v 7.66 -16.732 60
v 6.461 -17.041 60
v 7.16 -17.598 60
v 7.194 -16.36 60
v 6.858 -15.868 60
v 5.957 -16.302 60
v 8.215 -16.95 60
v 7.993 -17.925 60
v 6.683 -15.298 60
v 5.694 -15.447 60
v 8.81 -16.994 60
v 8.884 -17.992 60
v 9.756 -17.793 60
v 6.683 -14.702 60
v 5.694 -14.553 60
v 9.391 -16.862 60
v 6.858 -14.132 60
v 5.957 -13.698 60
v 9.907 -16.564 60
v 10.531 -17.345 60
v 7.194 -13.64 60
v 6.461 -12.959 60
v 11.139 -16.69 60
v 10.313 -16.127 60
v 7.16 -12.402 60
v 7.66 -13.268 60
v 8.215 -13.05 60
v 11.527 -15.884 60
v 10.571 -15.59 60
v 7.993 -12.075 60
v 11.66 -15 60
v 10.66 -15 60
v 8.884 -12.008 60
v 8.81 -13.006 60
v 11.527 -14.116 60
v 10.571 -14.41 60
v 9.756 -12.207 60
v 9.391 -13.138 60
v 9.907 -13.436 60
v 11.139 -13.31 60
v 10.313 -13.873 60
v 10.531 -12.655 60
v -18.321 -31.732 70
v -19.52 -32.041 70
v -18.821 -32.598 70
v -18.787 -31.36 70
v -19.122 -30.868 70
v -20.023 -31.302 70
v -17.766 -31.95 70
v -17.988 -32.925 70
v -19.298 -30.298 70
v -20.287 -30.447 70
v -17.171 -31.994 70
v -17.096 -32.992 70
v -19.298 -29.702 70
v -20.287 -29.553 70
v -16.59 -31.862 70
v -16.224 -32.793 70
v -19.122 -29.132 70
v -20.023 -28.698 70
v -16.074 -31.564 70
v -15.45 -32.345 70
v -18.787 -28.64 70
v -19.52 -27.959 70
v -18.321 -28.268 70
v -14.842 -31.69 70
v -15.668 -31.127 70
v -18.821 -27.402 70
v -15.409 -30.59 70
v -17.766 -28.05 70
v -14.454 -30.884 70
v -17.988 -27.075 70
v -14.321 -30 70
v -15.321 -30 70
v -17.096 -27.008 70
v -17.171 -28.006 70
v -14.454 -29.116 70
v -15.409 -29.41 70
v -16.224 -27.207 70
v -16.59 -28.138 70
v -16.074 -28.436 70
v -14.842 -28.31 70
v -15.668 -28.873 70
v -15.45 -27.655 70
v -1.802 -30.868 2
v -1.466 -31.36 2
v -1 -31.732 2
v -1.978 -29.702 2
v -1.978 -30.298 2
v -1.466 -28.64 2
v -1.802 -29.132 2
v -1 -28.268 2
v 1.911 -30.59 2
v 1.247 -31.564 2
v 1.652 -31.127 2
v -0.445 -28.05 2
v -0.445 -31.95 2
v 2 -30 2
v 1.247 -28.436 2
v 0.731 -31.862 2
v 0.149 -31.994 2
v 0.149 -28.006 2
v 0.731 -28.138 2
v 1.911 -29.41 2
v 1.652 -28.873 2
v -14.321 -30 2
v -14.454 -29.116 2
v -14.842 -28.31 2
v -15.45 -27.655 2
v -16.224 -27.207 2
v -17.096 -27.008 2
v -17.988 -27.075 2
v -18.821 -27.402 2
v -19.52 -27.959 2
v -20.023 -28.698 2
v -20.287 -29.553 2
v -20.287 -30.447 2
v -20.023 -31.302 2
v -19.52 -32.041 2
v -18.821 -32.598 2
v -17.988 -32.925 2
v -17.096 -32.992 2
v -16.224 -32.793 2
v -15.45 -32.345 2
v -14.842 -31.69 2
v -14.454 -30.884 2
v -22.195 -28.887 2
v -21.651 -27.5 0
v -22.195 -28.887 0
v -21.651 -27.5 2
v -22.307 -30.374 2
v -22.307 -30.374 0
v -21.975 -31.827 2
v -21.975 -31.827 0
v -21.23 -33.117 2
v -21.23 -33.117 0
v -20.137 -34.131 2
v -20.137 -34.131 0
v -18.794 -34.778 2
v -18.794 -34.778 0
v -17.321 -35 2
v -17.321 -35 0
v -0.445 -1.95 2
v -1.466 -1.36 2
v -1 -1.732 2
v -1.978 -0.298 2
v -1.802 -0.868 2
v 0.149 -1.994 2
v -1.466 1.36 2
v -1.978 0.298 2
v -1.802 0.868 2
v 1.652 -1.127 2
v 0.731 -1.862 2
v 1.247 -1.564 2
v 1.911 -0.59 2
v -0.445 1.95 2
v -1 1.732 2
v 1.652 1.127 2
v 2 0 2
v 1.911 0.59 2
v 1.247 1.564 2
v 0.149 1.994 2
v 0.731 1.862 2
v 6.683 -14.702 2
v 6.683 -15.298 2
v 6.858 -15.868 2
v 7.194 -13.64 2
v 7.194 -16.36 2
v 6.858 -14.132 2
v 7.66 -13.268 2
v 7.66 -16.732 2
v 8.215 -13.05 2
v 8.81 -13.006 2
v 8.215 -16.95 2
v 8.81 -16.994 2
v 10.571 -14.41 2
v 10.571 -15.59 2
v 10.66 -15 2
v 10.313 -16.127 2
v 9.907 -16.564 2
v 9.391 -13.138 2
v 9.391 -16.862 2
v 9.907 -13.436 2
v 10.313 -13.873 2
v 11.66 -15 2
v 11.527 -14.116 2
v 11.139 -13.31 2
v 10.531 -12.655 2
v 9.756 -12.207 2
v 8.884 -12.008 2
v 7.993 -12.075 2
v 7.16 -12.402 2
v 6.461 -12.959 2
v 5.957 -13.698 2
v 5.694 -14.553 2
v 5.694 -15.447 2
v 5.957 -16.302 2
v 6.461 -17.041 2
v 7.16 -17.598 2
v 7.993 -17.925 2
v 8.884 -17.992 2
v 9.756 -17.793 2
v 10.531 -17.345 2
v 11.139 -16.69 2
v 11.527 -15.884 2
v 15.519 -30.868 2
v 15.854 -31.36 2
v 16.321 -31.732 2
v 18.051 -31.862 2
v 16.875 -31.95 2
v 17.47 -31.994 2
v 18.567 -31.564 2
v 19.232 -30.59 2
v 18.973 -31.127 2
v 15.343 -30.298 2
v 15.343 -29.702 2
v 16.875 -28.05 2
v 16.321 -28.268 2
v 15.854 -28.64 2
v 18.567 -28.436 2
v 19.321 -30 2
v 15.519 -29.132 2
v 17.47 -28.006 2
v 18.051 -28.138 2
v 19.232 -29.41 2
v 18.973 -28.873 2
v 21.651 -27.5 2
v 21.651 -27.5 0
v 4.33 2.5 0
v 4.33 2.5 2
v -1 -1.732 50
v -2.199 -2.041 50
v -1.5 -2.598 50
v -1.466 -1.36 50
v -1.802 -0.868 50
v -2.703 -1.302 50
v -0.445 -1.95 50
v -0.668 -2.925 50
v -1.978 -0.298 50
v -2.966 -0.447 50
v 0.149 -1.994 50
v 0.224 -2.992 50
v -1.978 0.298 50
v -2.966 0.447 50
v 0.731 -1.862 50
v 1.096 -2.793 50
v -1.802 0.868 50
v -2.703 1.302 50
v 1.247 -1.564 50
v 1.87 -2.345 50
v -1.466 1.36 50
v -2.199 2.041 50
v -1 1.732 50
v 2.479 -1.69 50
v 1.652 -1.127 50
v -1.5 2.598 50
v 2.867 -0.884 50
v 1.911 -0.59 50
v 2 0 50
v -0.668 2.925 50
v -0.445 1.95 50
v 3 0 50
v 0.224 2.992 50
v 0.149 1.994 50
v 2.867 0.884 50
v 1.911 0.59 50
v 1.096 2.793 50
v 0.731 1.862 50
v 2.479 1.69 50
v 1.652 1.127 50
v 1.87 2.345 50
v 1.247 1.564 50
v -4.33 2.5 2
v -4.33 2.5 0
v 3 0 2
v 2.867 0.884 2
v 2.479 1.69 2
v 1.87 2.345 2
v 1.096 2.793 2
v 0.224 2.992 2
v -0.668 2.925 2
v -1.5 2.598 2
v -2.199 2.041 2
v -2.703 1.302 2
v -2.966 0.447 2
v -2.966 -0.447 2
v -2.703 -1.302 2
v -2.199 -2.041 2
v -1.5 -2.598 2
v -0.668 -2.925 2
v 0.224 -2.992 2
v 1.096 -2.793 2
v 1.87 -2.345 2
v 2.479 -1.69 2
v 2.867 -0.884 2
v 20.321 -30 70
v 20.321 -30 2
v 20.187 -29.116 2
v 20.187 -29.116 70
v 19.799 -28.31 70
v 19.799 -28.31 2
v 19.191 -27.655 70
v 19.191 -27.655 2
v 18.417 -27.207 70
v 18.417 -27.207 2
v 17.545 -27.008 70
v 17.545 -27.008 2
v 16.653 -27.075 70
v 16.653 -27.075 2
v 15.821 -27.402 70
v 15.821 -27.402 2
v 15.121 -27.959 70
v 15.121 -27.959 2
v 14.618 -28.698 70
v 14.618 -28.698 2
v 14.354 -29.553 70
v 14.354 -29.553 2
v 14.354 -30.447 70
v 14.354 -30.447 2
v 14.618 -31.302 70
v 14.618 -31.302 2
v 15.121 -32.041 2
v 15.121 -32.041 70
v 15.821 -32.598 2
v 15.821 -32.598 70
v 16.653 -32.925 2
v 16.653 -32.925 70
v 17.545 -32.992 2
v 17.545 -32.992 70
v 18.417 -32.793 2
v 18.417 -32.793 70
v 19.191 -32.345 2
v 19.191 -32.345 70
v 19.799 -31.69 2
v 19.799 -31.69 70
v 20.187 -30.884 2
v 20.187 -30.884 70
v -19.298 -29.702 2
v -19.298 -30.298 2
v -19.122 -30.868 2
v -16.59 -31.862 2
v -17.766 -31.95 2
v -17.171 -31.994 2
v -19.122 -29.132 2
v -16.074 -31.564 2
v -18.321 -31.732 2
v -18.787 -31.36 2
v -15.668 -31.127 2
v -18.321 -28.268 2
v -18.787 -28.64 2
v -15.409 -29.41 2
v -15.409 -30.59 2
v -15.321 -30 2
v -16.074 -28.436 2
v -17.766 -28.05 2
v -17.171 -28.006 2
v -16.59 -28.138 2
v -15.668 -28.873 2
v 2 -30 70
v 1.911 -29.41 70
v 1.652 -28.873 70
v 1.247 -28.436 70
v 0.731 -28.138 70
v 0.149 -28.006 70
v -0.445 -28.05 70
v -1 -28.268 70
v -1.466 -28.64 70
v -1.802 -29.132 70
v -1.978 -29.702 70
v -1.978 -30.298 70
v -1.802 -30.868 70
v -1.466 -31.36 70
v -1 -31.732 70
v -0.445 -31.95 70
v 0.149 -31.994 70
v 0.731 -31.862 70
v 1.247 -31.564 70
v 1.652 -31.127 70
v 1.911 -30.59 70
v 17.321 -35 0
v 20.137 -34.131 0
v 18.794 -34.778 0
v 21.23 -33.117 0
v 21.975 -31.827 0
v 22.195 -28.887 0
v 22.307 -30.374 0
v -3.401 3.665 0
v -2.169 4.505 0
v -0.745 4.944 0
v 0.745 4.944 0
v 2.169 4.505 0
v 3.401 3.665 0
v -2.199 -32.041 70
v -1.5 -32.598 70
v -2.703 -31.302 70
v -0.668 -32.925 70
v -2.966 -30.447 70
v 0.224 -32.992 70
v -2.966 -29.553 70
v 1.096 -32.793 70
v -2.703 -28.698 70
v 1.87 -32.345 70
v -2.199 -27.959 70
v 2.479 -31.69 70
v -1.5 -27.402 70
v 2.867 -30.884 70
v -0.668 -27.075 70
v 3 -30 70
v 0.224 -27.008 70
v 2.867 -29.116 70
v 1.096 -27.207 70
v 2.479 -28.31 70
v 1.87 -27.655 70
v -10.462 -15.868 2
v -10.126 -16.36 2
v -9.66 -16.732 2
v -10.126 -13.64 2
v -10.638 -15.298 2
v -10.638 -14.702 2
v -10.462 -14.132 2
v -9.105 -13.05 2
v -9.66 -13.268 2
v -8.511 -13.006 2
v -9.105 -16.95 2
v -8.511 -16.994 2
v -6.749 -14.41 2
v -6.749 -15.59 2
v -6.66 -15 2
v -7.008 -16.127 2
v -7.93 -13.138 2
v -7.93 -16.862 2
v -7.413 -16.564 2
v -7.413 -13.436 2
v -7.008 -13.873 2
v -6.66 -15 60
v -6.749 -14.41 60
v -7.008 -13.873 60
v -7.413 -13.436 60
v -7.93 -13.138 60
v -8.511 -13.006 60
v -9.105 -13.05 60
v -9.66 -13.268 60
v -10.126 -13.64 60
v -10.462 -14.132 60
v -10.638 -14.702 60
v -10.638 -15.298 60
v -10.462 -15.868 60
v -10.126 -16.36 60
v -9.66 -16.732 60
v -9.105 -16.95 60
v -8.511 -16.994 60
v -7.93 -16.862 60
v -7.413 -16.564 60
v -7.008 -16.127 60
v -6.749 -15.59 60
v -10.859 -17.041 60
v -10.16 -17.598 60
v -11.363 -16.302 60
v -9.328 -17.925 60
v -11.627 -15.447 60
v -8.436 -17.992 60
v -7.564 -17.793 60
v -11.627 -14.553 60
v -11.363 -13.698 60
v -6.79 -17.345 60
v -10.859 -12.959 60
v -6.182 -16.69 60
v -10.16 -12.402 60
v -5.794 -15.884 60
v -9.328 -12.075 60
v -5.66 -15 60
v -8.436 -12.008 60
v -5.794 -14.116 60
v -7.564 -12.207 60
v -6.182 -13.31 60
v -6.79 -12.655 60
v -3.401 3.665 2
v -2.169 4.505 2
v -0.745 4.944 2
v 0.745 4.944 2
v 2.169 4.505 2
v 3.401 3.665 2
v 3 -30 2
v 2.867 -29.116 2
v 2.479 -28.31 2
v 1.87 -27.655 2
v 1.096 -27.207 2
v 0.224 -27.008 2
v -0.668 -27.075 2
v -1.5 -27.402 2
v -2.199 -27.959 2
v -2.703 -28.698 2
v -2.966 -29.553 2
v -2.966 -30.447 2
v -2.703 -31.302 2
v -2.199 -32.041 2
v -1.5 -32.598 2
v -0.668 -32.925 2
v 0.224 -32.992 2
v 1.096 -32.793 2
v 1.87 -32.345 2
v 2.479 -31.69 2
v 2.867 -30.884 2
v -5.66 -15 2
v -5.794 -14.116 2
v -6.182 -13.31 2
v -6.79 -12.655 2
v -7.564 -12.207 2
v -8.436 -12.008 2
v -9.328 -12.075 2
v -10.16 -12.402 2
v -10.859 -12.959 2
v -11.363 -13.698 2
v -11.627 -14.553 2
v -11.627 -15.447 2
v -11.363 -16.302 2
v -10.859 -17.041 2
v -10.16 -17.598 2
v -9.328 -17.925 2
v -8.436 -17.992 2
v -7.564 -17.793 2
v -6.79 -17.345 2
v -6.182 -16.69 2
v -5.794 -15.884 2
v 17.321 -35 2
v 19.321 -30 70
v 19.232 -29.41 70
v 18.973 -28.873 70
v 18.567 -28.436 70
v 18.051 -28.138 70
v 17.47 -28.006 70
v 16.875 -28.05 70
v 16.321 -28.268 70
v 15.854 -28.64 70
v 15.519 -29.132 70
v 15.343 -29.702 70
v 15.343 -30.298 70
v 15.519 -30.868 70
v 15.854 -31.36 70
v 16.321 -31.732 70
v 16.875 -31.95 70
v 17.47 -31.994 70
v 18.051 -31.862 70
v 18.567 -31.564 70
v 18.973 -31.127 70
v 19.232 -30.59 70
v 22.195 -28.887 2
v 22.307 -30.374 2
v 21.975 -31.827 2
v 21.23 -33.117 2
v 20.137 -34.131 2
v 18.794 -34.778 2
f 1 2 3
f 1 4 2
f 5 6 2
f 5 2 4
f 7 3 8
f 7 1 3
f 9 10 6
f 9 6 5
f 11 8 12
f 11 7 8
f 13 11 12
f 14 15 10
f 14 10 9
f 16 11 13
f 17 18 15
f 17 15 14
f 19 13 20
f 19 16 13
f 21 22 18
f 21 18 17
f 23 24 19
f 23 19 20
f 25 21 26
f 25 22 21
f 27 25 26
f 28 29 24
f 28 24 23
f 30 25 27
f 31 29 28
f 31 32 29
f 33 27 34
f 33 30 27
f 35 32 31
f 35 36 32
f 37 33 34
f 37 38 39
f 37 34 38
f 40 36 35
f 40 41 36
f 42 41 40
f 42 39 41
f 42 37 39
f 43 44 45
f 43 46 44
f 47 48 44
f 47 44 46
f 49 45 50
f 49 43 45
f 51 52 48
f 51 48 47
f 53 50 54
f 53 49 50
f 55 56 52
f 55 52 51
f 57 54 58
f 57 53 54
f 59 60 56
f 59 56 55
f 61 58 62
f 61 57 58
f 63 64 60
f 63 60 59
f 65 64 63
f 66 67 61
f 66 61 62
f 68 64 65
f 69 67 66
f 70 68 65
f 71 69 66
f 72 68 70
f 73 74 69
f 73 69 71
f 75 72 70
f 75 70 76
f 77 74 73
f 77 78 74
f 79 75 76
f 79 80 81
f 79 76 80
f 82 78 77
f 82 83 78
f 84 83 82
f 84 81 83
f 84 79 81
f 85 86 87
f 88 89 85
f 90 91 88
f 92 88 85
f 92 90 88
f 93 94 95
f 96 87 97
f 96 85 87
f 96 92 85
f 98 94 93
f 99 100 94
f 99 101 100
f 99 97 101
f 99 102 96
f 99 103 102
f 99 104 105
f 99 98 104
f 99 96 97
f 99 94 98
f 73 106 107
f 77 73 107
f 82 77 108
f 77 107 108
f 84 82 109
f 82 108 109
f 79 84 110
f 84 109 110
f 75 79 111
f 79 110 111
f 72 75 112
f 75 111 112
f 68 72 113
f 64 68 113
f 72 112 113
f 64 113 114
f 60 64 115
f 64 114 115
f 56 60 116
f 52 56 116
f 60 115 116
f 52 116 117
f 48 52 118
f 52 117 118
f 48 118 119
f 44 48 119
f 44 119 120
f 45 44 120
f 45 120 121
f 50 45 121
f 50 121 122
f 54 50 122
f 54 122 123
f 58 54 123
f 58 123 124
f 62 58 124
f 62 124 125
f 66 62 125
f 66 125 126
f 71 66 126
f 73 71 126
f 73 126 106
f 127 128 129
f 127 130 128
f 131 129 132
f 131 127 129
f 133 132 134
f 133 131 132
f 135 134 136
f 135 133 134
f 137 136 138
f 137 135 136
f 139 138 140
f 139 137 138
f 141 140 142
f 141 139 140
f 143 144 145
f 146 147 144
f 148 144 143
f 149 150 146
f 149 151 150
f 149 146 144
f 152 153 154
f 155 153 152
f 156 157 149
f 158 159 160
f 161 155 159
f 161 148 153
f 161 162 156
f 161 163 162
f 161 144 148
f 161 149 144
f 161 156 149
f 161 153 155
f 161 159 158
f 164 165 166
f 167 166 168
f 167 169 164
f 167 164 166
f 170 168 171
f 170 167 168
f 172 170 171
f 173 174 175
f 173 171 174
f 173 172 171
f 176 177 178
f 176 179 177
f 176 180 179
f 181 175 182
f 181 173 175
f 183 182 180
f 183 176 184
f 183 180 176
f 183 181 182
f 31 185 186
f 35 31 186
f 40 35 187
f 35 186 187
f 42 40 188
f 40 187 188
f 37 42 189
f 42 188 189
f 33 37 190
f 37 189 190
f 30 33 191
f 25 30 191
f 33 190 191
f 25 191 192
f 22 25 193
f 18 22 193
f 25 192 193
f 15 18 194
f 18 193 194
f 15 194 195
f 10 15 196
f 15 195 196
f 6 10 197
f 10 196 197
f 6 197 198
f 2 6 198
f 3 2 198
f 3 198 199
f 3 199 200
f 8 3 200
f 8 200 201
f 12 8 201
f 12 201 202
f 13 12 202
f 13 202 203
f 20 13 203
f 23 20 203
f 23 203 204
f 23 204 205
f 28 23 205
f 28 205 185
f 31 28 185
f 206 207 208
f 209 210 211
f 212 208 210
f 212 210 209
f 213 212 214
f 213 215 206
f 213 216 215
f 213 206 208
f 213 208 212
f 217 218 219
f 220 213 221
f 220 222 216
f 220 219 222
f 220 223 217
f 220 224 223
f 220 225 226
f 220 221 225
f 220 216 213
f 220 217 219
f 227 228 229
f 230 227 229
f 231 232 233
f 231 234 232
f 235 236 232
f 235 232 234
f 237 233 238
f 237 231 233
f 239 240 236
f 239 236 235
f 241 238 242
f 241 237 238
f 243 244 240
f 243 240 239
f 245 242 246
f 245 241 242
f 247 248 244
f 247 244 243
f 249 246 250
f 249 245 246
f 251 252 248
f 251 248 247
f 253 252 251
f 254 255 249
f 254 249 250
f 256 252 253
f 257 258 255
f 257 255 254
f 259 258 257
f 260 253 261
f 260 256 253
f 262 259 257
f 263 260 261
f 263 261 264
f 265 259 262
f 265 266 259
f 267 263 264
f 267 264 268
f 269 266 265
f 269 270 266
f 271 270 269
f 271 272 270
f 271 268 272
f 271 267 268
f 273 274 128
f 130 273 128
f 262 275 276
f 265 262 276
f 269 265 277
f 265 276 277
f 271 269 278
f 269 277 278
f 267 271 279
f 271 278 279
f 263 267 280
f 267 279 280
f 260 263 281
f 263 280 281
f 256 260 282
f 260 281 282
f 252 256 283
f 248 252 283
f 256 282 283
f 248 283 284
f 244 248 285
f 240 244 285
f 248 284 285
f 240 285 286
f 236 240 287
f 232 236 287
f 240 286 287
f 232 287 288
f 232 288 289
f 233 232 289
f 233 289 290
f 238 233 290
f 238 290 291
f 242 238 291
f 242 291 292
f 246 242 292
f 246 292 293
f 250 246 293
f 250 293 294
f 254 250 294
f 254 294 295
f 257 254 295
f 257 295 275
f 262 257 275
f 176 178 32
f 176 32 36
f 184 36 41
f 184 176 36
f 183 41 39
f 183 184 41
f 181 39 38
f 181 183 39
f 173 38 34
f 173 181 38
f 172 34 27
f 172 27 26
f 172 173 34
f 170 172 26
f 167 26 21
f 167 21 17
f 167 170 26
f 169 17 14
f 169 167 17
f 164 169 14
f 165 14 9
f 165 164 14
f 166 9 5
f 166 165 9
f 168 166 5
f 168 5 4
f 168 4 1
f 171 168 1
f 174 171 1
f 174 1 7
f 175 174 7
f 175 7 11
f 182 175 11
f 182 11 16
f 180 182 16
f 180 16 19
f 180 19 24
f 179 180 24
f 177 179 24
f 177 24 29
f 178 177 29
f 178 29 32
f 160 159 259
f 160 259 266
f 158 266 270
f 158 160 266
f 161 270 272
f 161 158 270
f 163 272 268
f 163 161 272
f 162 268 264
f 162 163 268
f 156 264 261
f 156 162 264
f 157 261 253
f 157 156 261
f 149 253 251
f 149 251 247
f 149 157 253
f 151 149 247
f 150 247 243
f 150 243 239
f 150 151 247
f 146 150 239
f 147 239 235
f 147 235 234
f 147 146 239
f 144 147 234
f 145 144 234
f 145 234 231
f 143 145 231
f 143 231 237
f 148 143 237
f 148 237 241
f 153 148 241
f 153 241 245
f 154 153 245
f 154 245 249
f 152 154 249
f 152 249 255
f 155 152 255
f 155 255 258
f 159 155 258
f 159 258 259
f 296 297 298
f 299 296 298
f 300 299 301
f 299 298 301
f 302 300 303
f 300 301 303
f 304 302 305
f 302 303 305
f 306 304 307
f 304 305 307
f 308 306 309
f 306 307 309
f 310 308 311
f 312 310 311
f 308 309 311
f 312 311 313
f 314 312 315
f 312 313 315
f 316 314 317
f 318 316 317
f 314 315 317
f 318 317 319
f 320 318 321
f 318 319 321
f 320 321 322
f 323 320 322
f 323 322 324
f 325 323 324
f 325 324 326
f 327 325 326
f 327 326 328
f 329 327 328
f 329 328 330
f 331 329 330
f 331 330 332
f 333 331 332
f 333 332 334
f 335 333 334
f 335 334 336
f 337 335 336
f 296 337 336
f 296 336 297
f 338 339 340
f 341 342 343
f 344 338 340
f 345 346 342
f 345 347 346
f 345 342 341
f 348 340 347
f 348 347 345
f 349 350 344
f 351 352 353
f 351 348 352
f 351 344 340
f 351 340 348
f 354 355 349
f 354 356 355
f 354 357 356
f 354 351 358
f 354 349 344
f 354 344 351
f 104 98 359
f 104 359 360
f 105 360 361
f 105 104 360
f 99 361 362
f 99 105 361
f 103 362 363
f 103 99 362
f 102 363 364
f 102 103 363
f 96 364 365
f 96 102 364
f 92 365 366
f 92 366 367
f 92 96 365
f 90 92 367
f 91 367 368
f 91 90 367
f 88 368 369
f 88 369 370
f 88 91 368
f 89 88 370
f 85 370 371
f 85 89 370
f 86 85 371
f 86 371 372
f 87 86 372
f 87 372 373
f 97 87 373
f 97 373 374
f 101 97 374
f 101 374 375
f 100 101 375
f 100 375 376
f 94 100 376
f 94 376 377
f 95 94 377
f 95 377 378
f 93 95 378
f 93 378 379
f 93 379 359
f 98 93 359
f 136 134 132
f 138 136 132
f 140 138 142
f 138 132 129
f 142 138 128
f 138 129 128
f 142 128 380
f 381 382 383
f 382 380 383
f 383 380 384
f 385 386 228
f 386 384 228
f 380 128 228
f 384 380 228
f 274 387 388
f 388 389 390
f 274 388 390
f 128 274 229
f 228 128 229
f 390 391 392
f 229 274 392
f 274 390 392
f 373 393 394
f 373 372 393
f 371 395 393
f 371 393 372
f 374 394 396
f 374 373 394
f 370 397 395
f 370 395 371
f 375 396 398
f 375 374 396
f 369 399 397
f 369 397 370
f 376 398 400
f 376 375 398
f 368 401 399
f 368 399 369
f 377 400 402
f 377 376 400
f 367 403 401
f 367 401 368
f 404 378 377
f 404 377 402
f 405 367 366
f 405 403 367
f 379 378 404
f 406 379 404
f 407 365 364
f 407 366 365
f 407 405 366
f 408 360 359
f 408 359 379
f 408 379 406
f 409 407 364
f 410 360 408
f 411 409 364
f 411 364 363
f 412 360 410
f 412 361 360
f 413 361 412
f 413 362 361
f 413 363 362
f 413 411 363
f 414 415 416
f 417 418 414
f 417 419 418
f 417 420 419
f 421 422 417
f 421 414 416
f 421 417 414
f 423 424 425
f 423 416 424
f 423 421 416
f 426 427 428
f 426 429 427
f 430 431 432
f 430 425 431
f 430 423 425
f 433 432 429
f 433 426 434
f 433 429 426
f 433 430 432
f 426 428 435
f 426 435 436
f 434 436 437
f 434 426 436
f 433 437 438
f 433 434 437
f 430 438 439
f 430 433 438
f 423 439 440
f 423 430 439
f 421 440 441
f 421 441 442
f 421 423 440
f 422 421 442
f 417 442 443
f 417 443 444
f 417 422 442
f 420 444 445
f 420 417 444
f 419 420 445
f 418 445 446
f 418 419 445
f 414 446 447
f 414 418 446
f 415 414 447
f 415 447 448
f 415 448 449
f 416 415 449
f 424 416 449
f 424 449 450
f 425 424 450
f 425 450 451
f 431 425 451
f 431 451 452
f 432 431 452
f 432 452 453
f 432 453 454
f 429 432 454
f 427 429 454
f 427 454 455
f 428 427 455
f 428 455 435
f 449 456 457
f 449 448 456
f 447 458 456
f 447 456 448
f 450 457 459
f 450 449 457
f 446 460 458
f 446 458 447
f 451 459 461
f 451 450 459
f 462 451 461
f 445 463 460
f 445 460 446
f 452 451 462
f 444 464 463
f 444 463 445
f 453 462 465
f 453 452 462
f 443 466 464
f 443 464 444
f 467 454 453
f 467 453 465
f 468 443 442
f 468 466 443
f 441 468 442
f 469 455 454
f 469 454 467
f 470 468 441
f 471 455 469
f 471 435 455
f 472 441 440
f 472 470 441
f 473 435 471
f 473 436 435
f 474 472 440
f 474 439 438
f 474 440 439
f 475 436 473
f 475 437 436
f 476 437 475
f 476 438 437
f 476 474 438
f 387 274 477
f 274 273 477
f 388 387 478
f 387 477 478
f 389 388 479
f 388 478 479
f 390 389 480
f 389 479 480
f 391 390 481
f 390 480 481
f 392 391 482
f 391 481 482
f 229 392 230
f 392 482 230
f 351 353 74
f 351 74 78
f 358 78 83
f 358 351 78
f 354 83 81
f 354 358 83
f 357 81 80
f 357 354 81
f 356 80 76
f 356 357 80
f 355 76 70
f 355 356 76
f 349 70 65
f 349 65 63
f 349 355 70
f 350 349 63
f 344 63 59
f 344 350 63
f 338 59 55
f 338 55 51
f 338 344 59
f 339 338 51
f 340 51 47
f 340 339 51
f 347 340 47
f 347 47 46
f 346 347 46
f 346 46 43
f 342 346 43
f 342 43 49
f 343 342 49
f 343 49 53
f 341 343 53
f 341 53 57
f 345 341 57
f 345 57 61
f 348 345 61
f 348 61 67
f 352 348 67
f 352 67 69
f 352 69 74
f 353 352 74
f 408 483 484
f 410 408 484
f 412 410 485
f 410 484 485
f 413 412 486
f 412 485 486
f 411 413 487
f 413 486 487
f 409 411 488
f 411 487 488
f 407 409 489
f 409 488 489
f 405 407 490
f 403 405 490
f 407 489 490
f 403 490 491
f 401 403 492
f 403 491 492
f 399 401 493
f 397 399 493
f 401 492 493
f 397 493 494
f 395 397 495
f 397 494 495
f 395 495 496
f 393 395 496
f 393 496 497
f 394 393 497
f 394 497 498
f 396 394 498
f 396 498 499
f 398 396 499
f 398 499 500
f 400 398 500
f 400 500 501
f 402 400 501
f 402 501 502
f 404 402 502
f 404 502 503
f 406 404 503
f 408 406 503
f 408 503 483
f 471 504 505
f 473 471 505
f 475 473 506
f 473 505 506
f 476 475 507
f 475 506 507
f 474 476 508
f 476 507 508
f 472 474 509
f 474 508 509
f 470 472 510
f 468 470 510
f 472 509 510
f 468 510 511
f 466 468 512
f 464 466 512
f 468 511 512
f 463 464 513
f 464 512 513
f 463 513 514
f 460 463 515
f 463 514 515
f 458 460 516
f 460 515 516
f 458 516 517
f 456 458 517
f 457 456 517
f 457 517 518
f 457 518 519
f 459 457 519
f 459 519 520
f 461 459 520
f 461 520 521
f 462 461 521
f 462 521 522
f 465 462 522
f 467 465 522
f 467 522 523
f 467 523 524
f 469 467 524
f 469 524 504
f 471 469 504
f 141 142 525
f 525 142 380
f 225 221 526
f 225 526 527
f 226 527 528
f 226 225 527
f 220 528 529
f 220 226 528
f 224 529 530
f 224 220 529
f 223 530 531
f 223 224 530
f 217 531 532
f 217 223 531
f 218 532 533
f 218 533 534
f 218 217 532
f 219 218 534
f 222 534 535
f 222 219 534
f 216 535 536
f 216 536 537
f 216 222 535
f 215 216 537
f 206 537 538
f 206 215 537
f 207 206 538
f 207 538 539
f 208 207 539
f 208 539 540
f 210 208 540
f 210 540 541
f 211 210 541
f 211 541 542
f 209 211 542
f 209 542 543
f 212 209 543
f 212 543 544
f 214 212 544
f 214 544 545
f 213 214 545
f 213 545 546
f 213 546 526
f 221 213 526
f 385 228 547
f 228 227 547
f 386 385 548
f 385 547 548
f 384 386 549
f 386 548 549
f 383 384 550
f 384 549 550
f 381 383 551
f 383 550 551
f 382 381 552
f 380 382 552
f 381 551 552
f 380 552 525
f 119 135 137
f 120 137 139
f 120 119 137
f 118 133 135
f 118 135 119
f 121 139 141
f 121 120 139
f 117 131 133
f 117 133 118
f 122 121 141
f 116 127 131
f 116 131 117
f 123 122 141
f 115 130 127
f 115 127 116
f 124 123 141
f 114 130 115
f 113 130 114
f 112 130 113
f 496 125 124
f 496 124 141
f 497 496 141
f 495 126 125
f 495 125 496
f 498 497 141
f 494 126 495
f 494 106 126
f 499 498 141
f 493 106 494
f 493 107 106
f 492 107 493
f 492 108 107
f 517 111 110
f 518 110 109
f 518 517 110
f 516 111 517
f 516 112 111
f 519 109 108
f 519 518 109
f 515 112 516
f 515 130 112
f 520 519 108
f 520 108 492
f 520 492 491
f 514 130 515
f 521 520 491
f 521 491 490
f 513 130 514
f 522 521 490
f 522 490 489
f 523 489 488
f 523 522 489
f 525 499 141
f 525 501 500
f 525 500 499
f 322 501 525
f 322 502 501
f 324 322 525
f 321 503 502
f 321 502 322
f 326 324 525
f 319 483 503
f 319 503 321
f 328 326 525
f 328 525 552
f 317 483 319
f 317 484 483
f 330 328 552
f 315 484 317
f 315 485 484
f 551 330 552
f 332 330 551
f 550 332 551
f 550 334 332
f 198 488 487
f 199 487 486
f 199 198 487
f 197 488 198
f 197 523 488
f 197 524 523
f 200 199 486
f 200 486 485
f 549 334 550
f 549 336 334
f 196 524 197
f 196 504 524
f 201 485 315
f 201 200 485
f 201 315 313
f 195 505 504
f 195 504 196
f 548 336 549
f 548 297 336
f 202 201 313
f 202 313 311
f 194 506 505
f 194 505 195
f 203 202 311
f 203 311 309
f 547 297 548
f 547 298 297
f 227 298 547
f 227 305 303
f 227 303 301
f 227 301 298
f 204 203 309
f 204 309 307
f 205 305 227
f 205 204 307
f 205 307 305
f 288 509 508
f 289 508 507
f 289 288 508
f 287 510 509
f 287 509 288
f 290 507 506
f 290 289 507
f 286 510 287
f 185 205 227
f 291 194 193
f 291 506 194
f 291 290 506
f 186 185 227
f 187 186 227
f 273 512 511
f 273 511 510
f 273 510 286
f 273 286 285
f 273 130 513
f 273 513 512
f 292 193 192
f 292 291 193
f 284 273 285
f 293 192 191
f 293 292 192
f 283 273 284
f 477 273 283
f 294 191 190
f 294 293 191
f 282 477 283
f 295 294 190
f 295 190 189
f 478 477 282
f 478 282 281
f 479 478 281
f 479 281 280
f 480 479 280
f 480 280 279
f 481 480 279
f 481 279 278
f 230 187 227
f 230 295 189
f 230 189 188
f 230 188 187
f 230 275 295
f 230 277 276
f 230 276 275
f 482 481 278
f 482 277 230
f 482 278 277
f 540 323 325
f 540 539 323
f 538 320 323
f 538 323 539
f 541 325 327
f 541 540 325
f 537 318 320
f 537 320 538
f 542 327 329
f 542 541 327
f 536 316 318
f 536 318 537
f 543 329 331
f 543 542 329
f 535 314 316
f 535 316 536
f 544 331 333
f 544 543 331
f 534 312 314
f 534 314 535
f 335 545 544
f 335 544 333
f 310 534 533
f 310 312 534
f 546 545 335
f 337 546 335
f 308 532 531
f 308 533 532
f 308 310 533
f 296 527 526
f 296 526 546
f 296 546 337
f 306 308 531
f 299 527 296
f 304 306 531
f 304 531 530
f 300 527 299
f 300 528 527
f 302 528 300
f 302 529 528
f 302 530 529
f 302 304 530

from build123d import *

# Parameters (mm, degrees)
F0_R     = 3
F0_R_2   = 2
F1_DEPTH = 50
F2_DEPTH = 60
F3_DEPTH = 60
F4_DEPTH = 70
F5_DEPTH = 70
F6_DEPTH = 70
F8_DEPTH = 2
F9_R     = 5


with BuildPart() as f1:
    # F0 (on Top) → F1 (new body)
    with BuildSketch(Plane.XY):
        Circle(F0_R)
        Circle(F0_R_2, mode=Mode.SUBTRACT)
    extrude(amount=F1_DEPTH)



with BuildPart() as f2:
    # F0 (on Top) → F2 (new body)
    with BuildSketch(Plane.XY):
        with Locations((-8.660254, -15)):
            Circle(F0_R)
        with Locations((-8.660254, -15)):
            Circle(F0_R_2, mode=Mode.SUBTRACT)
    extrude(amount=F2_DEPTH)


with BuildPart() as f3:
    # F0 (on Top) → F3 (new body)
    with BuildSketch(Plane.XY):
        with Locations((8.660254, -15)):
            Circle(F0_R)
        with Locations((8.660254, -15)):
            Circle(F0_R_2, mode=Mode.SUBTRACT)
    extrude(amount=F3_DEPTH)


with BuildPart() as f4:
    # F0 (on Top) → F4 (new body)
    with BuildSketch(Plane.XY):
        with Locations((17.320508, -30)):
            Circle(F0_R)
        with Locations((17.320508, -30)):
            Circle(F0_R_2, mode=Mode.SUBTRACT)
    extrude(amount=F4_DEPTH)


with BuildPart() as f5:
    # F0 (on Top) → F5 (new body)
    with BuildSketch(Plane.XY):
        with Locations((0, -30)):
            Circle(F0_R)
        with Locations((0, -30)):
            Circle(F0_R_2, mode=Mode.SUBTRACT)
    extrude(amount=F5_DEPTH)


with BuildPart() as f6:
    # F0 (on Top) → F6 (new body)
    with BuildSketch(Plane.XY):
        with Locations((-17.320508, -30)):
            Circle(F0_R)
        with Locations((-17.320508, -30)):
            Circle(F0_R_2, mode=Mode.SUBTRACT)
    extrude(amount=F6_DEPTH)


with BuildPart() as f1_1:
    add(f1.part)

    add(f2.part)  # F8 merges F2

    add(f3.part)  # F8 merges F3

    add(f4.part)  # F8 merges F4

    add(f5.part)  # F8 merges F5

    add(f6.part)  # F8 merges F6
    # F7 (on Top) → F8 (join)
    with BuildSketch(Plane.XY):
        Polygon((0, 10), (-25.980762, -35), (25.980762, -35), align=None)
    extrude(amount=F8_DEPTH)

    # F9
    f9_edges = [f1_1.edges().sort_by_distance(p)[0] for p in [
        (0, 10, 1),
        (-25.980762, -35, 1),
        (25.980762, -35, 1),
    ]]
    fillet(f9_edges, radius=F9_R)


solid = f1_1.part
